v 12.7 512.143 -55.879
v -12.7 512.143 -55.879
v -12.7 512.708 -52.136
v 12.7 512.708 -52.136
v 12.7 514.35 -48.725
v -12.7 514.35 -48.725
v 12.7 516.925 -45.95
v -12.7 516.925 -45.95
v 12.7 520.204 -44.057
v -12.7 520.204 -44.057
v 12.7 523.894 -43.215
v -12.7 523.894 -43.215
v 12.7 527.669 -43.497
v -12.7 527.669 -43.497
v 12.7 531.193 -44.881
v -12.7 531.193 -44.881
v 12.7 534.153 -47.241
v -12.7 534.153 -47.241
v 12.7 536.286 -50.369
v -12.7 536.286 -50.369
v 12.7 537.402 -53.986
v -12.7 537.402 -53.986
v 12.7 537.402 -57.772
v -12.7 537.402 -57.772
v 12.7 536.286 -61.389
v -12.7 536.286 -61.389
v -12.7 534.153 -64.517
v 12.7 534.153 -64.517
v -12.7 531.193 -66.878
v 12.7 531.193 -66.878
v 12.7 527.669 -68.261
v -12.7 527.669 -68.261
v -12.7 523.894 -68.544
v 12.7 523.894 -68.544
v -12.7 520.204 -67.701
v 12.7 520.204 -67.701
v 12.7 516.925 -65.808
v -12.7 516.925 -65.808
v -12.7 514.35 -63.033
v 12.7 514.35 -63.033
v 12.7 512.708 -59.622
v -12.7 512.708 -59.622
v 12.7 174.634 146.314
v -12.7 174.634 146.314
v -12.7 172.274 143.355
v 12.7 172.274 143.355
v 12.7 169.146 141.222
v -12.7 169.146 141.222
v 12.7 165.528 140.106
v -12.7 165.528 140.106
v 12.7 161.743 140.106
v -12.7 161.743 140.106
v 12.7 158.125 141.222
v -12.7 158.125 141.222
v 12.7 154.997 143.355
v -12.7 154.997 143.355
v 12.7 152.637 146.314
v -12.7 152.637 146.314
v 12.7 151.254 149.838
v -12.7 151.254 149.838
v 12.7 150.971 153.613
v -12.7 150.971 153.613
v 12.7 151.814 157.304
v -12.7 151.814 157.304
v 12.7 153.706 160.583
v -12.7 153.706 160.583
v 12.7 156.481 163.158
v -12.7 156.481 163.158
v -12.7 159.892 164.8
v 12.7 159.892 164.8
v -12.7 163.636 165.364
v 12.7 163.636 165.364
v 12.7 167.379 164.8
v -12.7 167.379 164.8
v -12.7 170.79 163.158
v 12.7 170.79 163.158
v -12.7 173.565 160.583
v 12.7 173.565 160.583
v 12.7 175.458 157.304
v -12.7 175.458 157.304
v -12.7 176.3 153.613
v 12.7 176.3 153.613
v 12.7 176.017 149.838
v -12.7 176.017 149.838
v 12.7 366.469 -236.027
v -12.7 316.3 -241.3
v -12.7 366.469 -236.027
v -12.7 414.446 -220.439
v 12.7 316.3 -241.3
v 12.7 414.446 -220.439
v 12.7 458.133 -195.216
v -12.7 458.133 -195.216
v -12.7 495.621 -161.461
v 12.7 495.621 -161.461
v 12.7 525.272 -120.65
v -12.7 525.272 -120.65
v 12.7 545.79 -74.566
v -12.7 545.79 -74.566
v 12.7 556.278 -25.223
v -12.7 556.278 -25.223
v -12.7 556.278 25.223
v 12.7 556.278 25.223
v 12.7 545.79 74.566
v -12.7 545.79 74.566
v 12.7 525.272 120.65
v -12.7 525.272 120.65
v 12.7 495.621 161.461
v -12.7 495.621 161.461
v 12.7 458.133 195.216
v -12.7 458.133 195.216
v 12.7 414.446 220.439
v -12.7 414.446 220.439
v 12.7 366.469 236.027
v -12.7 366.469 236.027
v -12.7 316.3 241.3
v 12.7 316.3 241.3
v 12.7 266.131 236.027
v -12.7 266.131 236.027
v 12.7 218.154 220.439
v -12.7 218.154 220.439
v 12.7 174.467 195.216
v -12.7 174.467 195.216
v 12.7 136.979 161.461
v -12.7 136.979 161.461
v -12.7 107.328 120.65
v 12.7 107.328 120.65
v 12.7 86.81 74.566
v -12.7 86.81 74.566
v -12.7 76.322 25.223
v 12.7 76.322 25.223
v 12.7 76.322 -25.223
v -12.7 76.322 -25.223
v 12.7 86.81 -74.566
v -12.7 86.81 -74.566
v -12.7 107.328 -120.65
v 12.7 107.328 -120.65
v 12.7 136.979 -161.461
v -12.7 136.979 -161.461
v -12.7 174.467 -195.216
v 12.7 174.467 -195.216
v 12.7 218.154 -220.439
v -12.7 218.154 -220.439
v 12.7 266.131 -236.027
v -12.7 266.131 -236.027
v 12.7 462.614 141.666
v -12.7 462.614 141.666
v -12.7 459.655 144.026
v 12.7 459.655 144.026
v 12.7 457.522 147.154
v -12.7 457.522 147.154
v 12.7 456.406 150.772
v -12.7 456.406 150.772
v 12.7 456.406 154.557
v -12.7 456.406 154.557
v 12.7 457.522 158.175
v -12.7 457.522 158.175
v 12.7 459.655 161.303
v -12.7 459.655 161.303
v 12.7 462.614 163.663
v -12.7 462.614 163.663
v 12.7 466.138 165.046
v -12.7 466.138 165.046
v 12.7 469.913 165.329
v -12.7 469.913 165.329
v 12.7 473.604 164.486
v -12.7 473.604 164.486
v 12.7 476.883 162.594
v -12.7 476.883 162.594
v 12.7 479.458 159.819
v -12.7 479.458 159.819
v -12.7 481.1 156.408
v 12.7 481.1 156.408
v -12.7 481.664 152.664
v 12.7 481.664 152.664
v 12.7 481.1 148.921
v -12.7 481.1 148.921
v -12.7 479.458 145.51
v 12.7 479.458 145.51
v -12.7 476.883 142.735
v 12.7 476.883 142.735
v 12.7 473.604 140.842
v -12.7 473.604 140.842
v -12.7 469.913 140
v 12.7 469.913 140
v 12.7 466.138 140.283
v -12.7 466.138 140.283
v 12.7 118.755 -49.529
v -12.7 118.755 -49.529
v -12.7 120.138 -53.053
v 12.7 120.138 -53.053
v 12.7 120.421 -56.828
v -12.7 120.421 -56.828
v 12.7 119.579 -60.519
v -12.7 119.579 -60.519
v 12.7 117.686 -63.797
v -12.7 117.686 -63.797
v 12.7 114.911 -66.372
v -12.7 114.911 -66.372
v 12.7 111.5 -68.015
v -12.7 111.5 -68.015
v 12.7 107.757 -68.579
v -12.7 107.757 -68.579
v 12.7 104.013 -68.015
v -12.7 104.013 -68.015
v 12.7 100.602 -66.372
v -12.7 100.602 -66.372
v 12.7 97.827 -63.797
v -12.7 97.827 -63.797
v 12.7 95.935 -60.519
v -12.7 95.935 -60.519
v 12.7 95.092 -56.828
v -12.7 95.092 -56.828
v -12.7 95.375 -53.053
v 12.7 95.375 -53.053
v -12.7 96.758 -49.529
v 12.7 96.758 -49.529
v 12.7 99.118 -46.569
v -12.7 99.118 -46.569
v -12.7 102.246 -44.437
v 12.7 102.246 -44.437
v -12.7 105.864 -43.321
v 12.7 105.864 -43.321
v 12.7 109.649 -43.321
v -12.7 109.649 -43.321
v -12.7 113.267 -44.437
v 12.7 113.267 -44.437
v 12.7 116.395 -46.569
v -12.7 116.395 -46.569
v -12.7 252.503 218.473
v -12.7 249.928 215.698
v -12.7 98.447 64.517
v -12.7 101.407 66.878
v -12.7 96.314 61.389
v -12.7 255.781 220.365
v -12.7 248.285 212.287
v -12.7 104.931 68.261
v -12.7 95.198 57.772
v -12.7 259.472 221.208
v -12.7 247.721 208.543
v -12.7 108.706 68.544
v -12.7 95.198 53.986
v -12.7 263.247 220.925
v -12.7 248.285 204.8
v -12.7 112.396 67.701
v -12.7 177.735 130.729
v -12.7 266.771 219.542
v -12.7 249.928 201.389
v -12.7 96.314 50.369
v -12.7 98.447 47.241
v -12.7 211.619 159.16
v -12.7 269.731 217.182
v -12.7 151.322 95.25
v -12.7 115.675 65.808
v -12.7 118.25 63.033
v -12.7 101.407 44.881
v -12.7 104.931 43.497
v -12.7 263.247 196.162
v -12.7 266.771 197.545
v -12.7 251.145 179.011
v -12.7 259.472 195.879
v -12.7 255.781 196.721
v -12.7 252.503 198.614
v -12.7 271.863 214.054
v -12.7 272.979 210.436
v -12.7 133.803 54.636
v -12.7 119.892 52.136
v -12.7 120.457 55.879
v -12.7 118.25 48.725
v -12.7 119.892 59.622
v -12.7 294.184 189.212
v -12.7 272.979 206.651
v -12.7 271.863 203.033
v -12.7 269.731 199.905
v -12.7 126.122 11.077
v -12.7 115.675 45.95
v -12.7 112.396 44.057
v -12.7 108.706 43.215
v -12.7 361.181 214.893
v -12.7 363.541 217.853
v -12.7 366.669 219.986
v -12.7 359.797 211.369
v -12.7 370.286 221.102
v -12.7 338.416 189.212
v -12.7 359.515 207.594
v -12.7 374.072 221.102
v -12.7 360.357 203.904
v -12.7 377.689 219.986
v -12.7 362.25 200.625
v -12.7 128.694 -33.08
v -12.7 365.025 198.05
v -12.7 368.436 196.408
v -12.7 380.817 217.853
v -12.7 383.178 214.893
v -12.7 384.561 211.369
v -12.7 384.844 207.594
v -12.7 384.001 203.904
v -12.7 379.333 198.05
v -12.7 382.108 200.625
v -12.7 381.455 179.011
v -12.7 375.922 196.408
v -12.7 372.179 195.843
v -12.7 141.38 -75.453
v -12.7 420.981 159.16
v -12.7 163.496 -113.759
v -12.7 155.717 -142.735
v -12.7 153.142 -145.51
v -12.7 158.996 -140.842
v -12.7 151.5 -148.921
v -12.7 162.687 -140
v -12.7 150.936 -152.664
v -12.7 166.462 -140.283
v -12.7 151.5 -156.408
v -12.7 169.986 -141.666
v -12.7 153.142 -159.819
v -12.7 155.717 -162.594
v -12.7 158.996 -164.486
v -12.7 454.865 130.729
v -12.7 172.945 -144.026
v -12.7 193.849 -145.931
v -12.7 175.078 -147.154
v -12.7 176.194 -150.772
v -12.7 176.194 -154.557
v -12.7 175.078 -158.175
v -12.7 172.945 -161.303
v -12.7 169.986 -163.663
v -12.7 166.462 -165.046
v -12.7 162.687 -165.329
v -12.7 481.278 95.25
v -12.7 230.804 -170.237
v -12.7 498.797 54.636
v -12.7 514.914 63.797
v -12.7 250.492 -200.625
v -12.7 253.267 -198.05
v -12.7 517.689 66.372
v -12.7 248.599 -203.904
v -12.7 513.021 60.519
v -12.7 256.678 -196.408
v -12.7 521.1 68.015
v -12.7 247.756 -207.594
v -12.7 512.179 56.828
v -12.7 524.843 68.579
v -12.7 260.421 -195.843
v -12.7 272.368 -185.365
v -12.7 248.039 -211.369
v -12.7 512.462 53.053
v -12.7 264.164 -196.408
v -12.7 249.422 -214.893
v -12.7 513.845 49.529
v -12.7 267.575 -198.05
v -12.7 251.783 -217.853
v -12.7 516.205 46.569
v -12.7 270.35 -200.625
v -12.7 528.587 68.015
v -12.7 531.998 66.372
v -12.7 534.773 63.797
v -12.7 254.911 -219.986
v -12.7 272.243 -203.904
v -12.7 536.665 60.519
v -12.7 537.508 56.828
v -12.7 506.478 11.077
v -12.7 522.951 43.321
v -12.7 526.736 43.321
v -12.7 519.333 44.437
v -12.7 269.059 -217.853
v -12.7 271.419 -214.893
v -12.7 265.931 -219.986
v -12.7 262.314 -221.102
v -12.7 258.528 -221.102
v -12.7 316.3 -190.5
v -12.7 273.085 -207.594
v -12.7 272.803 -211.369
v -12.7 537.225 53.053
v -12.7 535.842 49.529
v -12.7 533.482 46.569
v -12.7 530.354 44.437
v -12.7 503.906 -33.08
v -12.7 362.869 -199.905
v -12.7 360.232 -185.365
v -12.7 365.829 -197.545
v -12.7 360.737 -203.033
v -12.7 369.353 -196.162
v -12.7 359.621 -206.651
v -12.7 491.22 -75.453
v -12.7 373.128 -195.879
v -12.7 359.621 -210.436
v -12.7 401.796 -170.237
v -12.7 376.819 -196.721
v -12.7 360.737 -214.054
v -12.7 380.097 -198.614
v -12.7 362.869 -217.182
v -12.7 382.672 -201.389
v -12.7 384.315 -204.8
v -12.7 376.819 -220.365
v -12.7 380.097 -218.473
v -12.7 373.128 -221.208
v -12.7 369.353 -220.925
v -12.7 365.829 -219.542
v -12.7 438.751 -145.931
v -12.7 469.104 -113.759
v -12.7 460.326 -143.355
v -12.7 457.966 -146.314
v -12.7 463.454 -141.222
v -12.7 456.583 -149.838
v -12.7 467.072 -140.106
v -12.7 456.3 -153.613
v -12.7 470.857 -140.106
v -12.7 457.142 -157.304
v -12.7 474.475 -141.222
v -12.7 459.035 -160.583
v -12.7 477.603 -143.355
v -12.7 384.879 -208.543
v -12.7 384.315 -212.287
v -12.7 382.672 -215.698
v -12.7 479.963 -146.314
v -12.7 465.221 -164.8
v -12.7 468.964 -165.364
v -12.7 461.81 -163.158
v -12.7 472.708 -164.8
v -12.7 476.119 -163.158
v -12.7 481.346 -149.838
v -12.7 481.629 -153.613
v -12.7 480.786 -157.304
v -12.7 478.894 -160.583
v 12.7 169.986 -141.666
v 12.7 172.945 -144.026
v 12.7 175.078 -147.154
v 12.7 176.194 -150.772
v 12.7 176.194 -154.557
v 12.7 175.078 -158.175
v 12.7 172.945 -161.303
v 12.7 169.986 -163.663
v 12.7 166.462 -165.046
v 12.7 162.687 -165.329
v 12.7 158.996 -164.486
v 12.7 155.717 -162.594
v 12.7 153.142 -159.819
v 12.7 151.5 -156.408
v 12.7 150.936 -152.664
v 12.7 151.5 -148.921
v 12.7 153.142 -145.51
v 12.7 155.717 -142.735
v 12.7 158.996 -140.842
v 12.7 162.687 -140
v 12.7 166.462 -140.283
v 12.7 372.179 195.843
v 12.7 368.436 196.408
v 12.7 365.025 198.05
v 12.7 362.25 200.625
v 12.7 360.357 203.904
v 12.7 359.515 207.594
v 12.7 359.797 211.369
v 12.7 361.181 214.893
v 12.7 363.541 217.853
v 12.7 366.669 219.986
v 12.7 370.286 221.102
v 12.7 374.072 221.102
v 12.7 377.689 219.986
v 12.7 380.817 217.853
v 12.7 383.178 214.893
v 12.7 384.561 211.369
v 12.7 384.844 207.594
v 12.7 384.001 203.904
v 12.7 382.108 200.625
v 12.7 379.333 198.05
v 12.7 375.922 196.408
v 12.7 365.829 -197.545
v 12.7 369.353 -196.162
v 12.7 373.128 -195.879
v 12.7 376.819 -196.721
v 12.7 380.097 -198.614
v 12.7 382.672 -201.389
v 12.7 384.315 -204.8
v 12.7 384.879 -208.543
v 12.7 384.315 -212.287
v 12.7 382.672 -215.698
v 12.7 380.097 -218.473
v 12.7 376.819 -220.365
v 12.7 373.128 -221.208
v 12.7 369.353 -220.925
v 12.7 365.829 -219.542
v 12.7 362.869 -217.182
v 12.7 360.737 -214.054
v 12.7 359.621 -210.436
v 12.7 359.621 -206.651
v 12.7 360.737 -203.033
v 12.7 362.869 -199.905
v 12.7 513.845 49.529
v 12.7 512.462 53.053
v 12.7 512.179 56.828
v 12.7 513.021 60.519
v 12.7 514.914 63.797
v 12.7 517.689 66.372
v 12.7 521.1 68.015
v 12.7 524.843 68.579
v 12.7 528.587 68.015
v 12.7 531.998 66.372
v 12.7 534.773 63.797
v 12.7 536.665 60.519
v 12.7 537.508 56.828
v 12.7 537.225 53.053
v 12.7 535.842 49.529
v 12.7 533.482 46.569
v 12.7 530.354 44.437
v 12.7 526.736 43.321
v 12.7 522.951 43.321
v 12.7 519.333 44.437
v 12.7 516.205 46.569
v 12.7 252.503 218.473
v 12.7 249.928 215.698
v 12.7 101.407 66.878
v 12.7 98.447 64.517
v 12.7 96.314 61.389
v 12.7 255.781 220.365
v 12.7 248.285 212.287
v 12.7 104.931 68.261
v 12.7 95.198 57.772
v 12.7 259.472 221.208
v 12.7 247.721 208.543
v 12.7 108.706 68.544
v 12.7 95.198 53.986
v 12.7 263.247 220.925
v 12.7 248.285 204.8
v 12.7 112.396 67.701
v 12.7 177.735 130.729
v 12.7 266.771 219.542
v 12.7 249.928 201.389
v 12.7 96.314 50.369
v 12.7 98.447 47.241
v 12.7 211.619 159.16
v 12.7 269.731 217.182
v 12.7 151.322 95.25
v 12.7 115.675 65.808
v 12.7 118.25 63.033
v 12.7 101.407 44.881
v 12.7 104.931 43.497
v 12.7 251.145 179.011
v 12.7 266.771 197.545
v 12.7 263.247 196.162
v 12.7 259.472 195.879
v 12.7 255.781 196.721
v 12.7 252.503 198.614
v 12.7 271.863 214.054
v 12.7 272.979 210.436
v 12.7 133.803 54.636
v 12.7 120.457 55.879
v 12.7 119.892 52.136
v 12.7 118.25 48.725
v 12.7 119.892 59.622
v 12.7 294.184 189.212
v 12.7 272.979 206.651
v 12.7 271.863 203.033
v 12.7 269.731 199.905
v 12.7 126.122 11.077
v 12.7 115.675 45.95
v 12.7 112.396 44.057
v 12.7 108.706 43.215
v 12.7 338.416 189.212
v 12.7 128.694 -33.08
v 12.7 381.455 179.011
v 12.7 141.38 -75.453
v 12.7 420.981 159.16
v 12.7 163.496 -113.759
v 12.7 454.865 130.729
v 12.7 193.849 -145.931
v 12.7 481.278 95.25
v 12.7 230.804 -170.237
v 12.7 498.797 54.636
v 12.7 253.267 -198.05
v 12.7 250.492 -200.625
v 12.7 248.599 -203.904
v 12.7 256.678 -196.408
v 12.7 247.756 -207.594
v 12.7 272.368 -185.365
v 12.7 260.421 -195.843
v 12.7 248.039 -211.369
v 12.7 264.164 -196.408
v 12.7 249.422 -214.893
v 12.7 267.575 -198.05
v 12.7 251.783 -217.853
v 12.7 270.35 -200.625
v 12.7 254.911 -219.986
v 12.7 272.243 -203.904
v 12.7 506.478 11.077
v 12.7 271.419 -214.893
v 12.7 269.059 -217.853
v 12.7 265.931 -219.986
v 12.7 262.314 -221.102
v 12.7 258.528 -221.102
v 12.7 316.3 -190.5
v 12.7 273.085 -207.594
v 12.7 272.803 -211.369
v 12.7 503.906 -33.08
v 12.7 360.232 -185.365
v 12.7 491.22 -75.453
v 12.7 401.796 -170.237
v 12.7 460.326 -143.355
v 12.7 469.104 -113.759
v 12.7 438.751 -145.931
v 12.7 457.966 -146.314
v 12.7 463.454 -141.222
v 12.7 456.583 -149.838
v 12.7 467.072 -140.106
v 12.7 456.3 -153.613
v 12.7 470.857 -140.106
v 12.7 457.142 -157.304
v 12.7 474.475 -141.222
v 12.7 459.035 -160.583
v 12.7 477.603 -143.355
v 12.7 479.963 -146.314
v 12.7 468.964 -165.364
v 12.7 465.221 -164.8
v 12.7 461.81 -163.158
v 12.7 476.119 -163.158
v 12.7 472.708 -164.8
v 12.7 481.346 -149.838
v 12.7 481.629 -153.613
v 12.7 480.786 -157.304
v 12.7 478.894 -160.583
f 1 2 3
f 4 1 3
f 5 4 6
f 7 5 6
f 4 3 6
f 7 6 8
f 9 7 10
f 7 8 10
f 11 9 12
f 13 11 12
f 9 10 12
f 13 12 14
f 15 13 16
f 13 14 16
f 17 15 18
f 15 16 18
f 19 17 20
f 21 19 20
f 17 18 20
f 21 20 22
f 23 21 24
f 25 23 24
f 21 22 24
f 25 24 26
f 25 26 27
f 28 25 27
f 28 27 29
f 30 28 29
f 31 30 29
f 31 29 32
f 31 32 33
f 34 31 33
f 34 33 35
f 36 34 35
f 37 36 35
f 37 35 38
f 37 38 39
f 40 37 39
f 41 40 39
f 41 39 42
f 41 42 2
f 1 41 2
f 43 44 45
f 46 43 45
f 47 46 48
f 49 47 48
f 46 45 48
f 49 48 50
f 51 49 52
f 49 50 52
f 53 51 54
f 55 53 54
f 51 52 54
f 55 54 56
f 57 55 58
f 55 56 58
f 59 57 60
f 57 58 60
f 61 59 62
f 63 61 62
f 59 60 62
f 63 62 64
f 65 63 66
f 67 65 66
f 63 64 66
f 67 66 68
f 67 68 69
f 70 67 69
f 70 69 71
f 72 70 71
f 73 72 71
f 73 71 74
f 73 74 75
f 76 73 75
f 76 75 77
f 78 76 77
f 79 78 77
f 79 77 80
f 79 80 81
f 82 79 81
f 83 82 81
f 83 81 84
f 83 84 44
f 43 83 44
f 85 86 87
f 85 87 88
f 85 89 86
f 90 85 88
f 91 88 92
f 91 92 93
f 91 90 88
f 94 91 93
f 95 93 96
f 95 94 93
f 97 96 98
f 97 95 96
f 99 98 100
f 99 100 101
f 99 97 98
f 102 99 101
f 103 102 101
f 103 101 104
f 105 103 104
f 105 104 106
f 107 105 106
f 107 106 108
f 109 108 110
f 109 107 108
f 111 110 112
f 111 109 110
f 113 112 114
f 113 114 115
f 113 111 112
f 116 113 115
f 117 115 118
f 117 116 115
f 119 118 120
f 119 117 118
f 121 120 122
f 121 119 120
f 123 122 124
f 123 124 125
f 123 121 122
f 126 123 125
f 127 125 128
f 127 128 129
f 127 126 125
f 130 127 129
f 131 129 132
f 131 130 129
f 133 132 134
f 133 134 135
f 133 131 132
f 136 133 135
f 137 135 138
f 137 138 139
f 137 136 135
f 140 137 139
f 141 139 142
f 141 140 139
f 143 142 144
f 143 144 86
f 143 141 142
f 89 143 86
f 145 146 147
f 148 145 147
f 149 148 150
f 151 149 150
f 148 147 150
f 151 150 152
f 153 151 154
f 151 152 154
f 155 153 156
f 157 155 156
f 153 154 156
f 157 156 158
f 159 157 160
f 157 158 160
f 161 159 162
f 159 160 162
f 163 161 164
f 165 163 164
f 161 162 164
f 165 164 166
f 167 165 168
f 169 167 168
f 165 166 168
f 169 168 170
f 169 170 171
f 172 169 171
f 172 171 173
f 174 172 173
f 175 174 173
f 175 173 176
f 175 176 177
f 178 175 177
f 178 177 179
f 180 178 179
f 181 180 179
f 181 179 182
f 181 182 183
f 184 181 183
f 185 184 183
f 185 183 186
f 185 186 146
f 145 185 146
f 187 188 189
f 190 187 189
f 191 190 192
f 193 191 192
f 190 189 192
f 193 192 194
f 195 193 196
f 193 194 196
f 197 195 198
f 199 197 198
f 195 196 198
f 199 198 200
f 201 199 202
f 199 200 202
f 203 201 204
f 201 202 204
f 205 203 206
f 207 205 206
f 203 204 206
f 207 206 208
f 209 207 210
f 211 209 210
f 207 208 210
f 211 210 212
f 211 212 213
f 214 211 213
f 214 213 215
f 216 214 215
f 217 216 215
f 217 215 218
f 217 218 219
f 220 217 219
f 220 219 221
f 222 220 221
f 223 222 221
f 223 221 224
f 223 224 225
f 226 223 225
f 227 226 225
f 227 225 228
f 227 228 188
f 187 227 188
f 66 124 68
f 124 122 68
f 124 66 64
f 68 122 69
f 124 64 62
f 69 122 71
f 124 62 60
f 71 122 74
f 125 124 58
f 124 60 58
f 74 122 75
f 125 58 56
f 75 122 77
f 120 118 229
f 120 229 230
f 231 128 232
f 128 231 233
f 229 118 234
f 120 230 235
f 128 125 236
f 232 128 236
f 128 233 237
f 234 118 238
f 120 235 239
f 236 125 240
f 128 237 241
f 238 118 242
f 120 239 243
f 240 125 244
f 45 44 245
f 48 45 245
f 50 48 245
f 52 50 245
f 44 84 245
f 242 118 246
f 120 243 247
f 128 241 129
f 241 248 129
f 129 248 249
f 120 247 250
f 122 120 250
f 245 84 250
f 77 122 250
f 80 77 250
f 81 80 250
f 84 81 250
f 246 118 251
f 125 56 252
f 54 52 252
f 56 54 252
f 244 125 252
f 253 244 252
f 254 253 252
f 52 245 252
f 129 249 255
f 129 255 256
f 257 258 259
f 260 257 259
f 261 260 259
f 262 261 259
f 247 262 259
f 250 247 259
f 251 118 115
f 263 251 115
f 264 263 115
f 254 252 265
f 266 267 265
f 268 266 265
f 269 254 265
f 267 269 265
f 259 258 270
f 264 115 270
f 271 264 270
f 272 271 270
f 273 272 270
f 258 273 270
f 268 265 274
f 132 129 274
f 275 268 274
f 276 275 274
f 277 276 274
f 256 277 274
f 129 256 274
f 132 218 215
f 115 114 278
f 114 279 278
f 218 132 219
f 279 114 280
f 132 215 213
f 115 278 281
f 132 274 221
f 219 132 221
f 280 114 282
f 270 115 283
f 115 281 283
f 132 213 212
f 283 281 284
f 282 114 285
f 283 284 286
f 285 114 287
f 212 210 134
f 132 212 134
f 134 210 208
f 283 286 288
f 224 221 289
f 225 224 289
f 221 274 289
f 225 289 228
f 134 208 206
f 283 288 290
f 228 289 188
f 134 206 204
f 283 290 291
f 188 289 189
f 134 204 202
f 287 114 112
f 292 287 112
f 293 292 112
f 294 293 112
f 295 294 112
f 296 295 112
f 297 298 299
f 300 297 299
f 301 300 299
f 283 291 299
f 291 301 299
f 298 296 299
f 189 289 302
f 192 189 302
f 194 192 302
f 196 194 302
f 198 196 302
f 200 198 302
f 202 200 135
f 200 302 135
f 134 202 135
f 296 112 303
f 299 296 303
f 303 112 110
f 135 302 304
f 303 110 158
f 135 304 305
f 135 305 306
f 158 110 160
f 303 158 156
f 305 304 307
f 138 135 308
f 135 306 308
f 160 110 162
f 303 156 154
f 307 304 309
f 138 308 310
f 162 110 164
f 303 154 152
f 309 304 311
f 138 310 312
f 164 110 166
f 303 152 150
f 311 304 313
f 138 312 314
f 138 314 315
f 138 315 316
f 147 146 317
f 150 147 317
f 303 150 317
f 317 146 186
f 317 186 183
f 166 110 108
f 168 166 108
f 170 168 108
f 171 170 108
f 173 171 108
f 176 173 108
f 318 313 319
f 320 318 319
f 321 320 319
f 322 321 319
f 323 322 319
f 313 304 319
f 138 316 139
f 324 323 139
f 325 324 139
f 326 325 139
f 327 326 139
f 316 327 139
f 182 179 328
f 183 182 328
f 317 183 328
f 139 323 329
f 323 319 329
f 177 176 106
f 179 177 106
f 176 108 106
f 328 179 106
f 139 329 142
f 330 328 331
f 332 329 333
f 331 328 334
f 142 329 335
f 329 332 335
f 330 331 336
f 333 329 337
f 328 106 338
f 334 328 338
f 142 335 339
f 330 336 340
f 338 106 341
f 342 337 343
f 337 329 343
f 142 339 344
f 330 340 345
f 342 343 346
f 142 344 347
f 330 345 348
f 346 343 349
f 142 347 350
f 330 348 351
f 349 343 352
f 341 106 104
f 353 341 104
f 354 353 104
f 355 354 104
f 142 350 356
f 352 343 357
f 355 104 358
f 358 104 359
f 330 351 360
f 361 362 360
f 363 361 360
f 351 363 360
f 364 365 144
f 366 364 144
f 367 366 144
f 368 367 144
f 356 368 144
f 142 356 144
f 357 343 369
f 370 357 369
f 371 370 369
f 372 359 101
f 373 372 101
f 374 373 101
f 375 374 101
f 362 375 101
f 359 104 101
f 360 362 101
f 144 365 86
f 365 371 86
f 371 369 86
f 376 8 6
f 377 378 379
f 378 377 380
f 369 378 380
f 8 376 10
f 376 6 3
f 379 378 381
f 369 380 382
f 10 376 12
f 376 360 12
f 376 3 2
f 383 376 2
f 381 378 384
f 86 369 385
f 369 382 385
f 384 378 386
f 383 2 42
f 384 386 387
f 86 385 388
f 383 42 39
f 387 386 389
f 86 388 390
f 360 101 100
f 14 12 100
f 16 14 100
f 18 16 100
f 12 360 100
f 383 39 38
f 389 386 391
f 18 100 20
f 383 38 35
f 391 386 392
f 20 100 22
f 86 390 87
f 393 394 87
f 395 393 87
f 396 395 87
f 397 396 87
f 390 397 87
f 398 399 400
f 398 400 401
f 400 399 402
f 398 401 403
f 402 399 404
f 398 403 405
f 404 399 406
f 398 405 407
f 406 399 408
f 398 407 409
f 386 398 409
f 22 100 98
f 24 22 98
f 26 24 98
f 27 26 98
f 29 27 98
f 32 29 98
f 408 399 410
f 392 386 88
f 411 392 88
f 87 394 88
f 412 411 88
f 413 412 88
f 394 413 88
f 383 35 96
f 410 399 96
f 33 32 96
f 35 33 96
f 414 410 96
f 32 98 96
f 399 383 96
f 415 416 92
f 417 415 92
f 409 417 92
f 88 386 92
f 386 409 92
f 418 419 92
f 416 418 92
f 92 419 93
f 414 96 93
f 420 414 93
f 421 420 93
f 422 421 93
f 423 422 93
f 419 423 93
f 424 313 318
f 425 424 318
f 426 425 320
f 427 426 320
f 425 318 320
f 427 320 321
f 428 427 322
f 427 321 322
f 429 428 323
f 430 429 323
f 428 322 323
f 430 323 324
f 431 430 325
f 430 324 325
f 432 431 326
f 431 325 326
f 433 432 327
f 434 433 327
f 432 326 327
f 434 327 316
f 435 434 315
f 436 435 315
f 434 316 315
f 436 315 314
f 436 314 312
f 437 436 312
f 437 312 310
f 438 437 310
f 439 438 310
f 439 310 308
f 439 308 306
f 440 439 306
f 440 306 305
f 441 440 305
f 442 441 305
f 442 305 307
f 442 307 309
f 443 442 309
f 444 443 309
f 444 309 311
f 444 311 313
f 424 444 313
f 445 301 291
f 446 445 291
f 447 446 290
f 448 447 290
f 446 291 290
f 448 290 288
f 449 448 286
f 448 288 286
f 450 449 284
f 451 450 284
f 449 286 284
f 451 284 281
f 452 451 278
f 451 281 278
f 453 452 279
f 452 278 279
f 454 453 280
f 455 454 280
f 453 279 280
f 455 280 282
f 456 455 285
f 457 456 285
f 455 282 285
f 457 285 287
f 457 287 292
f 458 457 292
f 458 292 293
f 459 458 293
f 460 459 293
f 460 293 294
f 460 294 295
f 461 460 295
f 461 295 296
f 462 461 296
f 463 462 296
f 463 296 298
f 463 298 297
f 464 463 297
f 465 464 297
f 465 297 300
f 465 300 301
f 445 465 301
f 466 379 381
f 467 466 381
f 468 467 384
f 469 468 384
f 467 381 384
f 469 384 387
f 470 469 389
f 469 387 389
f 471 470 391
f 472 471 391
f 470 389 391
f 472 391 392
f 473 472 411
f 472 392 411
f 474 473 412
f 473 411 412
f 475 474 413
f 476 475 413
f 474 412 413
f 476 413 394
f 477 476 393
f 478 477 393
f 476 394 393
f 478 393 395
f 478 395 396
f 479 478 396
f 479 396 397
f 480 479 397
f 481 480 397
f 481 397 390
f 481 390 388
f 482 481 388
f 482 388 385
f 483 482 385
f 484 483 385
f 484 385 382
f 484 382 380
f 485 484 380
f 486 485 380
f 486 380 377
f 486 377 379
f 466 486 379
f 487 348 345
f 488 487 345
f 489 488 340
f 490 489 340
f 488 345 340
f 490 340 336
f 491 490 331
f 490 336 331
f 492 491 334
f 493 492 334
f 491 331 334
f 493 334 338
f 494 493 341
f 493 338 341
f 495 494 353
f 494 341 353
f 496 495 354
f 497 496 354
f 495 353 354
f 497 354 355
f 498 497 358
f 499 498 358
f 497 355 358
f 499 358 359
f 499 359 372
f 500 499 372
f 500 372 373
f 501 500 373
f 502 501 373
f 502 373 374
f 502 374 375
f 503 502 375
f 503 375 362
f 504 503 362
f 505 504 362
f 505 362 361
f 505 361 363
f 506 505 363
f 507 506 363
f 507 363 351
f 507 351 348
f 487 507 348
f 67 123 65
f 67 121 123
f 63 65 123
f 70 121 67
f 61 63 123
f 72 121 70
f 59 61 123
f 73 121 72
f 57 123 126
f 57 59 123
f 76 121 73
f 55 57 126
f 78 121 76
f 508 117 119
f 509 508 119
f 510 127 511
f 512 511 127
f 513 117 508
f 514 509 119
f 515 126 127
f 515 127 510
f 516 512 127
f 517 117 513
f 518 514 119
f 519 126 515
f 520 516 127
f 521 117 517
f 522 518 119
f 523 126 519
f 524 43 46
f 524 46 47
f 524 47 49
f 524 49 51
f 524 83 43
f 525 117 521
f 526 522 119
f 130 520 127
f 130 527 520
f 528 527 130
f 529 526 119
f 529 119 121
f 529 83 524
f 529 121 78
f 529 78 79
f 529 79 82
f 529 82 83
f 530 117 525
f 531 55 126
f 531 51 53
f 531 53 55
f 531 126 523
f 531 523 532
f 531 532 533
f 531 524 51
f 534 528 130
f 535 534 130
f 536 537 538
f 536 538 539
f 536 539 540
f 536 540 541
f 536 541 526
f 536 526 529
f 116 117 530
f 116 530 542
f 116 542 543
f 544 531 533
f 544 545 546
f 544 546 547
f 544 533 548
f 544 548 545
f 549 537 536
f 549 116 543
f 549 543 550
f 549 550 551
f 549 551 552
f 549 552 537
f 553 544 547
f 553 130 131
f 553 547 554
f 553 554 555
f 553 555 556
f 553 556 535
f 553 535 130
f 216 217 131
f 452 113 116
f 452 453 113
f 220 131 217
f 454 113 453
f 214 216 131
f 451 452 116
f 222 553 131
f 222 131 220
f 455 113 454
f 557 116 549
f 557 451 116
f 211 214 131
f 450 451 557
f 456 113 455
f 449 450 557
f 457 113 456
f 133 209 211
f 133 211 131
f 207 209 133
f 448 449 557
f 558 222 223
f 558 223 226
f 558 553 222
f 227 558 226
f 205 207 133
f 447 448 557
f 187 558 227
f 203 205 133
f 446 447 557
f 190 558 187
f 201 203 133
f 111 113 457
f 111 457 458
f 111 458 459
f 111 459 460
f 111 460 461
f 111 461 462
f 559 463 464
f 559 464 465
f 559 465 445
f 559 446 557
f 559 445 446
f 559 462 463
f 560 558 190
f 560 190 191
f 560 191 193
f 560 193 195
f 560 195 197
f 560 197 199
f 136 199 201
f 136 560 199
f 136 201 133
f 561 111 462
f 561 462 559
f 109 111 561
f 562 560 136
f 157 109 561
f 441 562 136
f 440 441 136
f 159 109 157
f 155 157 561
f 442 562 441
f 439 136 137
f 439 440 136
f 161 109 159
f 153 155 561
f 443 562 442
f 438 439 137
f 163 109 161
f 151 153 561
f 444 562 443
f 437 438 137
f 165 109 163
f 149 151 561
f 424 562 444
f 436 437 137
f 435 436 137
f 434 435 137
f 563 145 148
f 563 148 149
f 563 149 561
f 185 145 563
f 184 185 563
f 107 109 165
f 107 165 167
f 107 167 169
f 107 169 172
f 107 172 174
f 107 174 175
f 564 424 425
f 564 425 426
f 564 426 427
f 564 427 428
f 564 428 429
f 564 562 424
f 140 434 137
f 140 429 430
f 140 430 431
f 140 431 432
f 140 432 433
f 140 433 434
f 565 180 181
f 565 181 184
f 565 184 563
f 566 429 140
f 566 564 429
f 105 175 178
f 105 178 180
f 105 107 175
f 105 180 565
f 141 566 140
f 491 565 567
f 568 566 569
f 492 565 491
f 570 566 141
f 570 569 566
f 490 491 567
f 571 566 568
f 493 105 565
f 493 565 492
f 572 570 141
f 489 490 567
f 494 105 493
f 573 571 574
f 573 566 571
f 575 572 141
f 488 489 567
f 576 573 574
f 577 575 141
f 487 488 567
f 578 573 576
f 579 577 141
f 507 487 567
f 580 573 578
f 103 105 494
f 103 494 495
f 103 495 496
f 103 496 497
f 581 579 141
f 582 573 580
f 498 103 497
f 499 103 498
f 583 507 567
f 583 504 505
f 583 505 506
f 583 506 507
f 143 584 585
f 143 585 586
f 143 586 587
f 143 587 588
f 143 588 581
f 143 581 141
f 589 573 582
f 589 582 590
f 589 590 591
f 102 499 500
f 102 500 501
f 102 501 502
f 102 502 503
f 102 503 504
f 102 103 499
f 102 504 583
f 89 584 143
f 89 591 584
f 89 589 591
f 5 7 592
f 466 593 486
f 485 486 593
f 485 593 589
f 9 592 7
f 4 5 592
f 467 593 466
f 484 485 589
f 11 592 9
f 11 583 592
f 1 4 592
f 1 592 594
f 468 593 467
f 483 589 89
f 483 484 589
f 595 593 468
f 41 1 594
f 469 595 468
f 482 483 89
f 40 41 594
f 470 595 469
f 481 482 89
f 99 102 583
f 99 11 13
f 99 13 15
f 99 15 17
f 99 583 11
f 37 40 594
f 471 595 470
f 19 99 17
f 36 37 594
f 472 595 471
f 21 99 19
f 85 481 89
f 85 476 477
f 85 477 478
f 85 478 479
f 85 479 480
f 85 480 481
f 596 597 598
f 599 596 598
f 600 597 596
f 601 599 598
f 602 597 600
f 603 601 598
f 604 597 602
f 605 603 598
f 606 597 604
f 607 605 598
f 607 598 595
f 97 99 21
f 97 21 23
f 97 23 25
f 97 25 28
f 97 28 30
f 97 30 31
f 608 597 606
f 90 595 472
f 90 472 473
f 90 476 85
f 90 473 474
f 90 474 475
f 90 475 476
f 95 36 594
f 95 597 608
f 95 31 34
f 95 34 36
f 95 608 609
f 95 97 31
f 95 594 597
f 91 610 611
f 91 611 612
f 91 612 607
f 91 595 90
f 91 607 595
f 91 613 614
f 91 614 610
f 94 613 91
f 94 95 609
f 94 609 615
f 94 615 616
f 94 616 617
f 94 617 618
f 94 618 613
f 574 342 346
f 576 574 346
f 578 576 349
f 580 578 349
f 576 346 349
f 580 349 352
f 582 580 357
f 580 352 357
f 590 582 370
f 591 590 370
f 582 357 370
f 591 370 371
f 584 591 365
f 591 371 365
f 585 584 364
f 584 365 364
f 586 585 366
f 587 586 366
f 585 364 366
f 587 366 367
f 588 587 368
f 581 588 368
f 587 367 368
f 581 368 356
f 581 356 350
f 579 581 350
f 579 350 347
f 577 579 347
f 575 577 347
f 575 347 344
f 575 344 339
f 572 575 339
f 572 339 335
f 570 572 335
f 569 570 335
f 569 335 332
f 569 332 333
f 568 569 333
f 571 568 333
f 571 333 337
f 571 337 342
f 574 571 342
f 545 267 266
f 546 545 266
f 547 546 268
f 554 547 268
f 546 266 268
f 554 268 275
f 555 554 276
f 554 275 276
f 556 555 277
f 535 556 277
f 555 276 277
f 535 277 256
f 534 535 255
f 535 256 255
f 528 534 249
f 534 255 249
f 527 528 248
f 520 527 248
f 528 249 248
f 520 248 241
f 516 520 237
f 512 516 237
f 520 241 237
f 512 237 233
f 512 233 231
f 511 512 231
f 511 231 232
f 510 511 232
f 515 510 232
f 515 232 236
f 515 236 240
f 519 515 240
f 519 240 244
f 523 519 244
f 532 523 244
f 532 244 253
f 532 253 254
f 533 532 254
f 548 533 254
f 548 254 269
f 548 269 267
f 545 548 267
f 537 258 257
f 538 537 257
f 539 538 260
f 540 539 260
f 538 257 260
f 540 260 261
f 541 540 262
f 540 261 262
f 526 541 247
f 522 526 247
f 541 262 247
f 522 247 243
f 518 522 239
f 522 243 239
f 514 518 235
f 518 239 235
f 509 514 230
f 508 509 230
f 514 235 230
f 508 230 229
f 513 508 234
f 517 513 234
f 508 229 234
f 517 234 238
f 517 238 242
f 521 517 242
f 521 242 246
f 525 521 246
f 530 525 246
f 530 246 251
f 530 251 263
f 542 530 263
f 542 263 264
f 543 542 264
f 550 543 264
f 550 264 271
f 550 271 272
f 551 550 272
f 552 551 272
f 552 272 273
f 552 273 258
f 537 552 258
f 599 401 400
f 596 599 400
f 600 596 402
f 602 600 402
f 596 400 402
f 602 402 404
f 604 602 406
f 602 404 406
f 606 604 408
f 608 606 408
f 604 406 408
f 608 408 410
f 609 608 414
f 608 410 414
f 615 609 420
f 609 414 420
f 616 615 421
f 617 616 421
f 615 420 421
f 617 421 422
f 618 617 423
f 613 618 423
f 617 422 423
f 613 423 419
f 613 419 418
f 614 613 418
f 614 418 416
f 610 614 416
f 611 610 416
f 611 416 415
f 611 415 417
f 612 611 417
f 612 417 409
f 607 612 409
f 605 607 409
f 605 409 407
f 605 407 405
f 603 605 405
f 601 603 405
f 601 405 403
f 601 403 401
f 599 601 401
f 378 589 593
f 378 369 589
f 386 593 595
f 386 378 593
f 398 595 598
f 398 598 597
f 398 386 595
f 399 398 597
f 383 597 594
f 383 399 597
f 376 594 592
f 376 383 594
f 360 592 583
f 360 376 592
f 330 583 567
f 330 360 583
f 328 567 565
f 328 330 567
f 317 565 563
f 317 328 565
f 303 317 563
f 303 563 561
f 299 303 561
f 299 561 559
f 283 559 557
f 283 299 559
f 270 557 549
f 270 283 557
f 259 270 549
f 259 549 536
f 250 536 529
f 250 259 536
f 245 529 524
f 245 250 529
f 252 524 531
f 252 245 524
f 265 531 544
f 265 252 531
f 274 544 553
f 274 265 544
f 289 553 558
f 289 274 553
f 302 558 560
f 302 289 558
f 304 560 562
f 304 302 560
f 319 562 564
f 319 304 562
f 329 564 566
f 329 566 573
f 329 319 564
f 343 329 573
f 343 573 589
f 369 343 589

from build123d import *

# Parameters (mm, degrees)
SKETCH6_R                = 241.3
SKETCH6_R_2              = 190.5
BOSS_EXTRUDE1_DEPTH      = 12.7
F_7_8_1_DIAMETER_HOLE1_D = 25.4
CIRPATTERN1_COUNT        = 12


with BuildPart() as part:
    # Sketch6 → Boss-Extrude1 (new, symmetric)
    with BuildSketch(Plane(origin=(0, 0, 0), x_dir=(0, 0, -1), z_dir=(1, 0, 0))):
        with Locations((0, 316.3)):
            Circle(SKETCH6_R)
        with Locations((0, 316.3)):
            Circle(SKETCH6_R_2, mode=Mode.SUBTRACT)
    extrude(amount=BOSS_EXTRUDE1_DEPTH, both=True)

    # 7/8 (1) Diameter Hole1 (through all)
    with Locations(Plane(origin=(12.7, 0, 0), x_dir=(0, 0, -1), z_dir=(1, 0, 0))):
        with Locations((208.543385896, 260.420968162)):
            f_7_8_1_diameter_hole1 = Hole(F_7_8_1_DIAMETER_HOLE1_D / 2)

    # CirPattern1: 7/8 (1) Diameter Hole1 ×12 about axis
    cirpattern1_axis = Axis((12.7, 316.3, 0), (-1, 0, 0))
    for i in range(1, CIRPATTERN1_COUNT):
        add(f_7_8_1_diameter_hole1.rotate(cirpattern1_axis, i * 360 / CIRPATTERN1_COUNT), mode=Mode.SUBTRACT)


solid = part.part
